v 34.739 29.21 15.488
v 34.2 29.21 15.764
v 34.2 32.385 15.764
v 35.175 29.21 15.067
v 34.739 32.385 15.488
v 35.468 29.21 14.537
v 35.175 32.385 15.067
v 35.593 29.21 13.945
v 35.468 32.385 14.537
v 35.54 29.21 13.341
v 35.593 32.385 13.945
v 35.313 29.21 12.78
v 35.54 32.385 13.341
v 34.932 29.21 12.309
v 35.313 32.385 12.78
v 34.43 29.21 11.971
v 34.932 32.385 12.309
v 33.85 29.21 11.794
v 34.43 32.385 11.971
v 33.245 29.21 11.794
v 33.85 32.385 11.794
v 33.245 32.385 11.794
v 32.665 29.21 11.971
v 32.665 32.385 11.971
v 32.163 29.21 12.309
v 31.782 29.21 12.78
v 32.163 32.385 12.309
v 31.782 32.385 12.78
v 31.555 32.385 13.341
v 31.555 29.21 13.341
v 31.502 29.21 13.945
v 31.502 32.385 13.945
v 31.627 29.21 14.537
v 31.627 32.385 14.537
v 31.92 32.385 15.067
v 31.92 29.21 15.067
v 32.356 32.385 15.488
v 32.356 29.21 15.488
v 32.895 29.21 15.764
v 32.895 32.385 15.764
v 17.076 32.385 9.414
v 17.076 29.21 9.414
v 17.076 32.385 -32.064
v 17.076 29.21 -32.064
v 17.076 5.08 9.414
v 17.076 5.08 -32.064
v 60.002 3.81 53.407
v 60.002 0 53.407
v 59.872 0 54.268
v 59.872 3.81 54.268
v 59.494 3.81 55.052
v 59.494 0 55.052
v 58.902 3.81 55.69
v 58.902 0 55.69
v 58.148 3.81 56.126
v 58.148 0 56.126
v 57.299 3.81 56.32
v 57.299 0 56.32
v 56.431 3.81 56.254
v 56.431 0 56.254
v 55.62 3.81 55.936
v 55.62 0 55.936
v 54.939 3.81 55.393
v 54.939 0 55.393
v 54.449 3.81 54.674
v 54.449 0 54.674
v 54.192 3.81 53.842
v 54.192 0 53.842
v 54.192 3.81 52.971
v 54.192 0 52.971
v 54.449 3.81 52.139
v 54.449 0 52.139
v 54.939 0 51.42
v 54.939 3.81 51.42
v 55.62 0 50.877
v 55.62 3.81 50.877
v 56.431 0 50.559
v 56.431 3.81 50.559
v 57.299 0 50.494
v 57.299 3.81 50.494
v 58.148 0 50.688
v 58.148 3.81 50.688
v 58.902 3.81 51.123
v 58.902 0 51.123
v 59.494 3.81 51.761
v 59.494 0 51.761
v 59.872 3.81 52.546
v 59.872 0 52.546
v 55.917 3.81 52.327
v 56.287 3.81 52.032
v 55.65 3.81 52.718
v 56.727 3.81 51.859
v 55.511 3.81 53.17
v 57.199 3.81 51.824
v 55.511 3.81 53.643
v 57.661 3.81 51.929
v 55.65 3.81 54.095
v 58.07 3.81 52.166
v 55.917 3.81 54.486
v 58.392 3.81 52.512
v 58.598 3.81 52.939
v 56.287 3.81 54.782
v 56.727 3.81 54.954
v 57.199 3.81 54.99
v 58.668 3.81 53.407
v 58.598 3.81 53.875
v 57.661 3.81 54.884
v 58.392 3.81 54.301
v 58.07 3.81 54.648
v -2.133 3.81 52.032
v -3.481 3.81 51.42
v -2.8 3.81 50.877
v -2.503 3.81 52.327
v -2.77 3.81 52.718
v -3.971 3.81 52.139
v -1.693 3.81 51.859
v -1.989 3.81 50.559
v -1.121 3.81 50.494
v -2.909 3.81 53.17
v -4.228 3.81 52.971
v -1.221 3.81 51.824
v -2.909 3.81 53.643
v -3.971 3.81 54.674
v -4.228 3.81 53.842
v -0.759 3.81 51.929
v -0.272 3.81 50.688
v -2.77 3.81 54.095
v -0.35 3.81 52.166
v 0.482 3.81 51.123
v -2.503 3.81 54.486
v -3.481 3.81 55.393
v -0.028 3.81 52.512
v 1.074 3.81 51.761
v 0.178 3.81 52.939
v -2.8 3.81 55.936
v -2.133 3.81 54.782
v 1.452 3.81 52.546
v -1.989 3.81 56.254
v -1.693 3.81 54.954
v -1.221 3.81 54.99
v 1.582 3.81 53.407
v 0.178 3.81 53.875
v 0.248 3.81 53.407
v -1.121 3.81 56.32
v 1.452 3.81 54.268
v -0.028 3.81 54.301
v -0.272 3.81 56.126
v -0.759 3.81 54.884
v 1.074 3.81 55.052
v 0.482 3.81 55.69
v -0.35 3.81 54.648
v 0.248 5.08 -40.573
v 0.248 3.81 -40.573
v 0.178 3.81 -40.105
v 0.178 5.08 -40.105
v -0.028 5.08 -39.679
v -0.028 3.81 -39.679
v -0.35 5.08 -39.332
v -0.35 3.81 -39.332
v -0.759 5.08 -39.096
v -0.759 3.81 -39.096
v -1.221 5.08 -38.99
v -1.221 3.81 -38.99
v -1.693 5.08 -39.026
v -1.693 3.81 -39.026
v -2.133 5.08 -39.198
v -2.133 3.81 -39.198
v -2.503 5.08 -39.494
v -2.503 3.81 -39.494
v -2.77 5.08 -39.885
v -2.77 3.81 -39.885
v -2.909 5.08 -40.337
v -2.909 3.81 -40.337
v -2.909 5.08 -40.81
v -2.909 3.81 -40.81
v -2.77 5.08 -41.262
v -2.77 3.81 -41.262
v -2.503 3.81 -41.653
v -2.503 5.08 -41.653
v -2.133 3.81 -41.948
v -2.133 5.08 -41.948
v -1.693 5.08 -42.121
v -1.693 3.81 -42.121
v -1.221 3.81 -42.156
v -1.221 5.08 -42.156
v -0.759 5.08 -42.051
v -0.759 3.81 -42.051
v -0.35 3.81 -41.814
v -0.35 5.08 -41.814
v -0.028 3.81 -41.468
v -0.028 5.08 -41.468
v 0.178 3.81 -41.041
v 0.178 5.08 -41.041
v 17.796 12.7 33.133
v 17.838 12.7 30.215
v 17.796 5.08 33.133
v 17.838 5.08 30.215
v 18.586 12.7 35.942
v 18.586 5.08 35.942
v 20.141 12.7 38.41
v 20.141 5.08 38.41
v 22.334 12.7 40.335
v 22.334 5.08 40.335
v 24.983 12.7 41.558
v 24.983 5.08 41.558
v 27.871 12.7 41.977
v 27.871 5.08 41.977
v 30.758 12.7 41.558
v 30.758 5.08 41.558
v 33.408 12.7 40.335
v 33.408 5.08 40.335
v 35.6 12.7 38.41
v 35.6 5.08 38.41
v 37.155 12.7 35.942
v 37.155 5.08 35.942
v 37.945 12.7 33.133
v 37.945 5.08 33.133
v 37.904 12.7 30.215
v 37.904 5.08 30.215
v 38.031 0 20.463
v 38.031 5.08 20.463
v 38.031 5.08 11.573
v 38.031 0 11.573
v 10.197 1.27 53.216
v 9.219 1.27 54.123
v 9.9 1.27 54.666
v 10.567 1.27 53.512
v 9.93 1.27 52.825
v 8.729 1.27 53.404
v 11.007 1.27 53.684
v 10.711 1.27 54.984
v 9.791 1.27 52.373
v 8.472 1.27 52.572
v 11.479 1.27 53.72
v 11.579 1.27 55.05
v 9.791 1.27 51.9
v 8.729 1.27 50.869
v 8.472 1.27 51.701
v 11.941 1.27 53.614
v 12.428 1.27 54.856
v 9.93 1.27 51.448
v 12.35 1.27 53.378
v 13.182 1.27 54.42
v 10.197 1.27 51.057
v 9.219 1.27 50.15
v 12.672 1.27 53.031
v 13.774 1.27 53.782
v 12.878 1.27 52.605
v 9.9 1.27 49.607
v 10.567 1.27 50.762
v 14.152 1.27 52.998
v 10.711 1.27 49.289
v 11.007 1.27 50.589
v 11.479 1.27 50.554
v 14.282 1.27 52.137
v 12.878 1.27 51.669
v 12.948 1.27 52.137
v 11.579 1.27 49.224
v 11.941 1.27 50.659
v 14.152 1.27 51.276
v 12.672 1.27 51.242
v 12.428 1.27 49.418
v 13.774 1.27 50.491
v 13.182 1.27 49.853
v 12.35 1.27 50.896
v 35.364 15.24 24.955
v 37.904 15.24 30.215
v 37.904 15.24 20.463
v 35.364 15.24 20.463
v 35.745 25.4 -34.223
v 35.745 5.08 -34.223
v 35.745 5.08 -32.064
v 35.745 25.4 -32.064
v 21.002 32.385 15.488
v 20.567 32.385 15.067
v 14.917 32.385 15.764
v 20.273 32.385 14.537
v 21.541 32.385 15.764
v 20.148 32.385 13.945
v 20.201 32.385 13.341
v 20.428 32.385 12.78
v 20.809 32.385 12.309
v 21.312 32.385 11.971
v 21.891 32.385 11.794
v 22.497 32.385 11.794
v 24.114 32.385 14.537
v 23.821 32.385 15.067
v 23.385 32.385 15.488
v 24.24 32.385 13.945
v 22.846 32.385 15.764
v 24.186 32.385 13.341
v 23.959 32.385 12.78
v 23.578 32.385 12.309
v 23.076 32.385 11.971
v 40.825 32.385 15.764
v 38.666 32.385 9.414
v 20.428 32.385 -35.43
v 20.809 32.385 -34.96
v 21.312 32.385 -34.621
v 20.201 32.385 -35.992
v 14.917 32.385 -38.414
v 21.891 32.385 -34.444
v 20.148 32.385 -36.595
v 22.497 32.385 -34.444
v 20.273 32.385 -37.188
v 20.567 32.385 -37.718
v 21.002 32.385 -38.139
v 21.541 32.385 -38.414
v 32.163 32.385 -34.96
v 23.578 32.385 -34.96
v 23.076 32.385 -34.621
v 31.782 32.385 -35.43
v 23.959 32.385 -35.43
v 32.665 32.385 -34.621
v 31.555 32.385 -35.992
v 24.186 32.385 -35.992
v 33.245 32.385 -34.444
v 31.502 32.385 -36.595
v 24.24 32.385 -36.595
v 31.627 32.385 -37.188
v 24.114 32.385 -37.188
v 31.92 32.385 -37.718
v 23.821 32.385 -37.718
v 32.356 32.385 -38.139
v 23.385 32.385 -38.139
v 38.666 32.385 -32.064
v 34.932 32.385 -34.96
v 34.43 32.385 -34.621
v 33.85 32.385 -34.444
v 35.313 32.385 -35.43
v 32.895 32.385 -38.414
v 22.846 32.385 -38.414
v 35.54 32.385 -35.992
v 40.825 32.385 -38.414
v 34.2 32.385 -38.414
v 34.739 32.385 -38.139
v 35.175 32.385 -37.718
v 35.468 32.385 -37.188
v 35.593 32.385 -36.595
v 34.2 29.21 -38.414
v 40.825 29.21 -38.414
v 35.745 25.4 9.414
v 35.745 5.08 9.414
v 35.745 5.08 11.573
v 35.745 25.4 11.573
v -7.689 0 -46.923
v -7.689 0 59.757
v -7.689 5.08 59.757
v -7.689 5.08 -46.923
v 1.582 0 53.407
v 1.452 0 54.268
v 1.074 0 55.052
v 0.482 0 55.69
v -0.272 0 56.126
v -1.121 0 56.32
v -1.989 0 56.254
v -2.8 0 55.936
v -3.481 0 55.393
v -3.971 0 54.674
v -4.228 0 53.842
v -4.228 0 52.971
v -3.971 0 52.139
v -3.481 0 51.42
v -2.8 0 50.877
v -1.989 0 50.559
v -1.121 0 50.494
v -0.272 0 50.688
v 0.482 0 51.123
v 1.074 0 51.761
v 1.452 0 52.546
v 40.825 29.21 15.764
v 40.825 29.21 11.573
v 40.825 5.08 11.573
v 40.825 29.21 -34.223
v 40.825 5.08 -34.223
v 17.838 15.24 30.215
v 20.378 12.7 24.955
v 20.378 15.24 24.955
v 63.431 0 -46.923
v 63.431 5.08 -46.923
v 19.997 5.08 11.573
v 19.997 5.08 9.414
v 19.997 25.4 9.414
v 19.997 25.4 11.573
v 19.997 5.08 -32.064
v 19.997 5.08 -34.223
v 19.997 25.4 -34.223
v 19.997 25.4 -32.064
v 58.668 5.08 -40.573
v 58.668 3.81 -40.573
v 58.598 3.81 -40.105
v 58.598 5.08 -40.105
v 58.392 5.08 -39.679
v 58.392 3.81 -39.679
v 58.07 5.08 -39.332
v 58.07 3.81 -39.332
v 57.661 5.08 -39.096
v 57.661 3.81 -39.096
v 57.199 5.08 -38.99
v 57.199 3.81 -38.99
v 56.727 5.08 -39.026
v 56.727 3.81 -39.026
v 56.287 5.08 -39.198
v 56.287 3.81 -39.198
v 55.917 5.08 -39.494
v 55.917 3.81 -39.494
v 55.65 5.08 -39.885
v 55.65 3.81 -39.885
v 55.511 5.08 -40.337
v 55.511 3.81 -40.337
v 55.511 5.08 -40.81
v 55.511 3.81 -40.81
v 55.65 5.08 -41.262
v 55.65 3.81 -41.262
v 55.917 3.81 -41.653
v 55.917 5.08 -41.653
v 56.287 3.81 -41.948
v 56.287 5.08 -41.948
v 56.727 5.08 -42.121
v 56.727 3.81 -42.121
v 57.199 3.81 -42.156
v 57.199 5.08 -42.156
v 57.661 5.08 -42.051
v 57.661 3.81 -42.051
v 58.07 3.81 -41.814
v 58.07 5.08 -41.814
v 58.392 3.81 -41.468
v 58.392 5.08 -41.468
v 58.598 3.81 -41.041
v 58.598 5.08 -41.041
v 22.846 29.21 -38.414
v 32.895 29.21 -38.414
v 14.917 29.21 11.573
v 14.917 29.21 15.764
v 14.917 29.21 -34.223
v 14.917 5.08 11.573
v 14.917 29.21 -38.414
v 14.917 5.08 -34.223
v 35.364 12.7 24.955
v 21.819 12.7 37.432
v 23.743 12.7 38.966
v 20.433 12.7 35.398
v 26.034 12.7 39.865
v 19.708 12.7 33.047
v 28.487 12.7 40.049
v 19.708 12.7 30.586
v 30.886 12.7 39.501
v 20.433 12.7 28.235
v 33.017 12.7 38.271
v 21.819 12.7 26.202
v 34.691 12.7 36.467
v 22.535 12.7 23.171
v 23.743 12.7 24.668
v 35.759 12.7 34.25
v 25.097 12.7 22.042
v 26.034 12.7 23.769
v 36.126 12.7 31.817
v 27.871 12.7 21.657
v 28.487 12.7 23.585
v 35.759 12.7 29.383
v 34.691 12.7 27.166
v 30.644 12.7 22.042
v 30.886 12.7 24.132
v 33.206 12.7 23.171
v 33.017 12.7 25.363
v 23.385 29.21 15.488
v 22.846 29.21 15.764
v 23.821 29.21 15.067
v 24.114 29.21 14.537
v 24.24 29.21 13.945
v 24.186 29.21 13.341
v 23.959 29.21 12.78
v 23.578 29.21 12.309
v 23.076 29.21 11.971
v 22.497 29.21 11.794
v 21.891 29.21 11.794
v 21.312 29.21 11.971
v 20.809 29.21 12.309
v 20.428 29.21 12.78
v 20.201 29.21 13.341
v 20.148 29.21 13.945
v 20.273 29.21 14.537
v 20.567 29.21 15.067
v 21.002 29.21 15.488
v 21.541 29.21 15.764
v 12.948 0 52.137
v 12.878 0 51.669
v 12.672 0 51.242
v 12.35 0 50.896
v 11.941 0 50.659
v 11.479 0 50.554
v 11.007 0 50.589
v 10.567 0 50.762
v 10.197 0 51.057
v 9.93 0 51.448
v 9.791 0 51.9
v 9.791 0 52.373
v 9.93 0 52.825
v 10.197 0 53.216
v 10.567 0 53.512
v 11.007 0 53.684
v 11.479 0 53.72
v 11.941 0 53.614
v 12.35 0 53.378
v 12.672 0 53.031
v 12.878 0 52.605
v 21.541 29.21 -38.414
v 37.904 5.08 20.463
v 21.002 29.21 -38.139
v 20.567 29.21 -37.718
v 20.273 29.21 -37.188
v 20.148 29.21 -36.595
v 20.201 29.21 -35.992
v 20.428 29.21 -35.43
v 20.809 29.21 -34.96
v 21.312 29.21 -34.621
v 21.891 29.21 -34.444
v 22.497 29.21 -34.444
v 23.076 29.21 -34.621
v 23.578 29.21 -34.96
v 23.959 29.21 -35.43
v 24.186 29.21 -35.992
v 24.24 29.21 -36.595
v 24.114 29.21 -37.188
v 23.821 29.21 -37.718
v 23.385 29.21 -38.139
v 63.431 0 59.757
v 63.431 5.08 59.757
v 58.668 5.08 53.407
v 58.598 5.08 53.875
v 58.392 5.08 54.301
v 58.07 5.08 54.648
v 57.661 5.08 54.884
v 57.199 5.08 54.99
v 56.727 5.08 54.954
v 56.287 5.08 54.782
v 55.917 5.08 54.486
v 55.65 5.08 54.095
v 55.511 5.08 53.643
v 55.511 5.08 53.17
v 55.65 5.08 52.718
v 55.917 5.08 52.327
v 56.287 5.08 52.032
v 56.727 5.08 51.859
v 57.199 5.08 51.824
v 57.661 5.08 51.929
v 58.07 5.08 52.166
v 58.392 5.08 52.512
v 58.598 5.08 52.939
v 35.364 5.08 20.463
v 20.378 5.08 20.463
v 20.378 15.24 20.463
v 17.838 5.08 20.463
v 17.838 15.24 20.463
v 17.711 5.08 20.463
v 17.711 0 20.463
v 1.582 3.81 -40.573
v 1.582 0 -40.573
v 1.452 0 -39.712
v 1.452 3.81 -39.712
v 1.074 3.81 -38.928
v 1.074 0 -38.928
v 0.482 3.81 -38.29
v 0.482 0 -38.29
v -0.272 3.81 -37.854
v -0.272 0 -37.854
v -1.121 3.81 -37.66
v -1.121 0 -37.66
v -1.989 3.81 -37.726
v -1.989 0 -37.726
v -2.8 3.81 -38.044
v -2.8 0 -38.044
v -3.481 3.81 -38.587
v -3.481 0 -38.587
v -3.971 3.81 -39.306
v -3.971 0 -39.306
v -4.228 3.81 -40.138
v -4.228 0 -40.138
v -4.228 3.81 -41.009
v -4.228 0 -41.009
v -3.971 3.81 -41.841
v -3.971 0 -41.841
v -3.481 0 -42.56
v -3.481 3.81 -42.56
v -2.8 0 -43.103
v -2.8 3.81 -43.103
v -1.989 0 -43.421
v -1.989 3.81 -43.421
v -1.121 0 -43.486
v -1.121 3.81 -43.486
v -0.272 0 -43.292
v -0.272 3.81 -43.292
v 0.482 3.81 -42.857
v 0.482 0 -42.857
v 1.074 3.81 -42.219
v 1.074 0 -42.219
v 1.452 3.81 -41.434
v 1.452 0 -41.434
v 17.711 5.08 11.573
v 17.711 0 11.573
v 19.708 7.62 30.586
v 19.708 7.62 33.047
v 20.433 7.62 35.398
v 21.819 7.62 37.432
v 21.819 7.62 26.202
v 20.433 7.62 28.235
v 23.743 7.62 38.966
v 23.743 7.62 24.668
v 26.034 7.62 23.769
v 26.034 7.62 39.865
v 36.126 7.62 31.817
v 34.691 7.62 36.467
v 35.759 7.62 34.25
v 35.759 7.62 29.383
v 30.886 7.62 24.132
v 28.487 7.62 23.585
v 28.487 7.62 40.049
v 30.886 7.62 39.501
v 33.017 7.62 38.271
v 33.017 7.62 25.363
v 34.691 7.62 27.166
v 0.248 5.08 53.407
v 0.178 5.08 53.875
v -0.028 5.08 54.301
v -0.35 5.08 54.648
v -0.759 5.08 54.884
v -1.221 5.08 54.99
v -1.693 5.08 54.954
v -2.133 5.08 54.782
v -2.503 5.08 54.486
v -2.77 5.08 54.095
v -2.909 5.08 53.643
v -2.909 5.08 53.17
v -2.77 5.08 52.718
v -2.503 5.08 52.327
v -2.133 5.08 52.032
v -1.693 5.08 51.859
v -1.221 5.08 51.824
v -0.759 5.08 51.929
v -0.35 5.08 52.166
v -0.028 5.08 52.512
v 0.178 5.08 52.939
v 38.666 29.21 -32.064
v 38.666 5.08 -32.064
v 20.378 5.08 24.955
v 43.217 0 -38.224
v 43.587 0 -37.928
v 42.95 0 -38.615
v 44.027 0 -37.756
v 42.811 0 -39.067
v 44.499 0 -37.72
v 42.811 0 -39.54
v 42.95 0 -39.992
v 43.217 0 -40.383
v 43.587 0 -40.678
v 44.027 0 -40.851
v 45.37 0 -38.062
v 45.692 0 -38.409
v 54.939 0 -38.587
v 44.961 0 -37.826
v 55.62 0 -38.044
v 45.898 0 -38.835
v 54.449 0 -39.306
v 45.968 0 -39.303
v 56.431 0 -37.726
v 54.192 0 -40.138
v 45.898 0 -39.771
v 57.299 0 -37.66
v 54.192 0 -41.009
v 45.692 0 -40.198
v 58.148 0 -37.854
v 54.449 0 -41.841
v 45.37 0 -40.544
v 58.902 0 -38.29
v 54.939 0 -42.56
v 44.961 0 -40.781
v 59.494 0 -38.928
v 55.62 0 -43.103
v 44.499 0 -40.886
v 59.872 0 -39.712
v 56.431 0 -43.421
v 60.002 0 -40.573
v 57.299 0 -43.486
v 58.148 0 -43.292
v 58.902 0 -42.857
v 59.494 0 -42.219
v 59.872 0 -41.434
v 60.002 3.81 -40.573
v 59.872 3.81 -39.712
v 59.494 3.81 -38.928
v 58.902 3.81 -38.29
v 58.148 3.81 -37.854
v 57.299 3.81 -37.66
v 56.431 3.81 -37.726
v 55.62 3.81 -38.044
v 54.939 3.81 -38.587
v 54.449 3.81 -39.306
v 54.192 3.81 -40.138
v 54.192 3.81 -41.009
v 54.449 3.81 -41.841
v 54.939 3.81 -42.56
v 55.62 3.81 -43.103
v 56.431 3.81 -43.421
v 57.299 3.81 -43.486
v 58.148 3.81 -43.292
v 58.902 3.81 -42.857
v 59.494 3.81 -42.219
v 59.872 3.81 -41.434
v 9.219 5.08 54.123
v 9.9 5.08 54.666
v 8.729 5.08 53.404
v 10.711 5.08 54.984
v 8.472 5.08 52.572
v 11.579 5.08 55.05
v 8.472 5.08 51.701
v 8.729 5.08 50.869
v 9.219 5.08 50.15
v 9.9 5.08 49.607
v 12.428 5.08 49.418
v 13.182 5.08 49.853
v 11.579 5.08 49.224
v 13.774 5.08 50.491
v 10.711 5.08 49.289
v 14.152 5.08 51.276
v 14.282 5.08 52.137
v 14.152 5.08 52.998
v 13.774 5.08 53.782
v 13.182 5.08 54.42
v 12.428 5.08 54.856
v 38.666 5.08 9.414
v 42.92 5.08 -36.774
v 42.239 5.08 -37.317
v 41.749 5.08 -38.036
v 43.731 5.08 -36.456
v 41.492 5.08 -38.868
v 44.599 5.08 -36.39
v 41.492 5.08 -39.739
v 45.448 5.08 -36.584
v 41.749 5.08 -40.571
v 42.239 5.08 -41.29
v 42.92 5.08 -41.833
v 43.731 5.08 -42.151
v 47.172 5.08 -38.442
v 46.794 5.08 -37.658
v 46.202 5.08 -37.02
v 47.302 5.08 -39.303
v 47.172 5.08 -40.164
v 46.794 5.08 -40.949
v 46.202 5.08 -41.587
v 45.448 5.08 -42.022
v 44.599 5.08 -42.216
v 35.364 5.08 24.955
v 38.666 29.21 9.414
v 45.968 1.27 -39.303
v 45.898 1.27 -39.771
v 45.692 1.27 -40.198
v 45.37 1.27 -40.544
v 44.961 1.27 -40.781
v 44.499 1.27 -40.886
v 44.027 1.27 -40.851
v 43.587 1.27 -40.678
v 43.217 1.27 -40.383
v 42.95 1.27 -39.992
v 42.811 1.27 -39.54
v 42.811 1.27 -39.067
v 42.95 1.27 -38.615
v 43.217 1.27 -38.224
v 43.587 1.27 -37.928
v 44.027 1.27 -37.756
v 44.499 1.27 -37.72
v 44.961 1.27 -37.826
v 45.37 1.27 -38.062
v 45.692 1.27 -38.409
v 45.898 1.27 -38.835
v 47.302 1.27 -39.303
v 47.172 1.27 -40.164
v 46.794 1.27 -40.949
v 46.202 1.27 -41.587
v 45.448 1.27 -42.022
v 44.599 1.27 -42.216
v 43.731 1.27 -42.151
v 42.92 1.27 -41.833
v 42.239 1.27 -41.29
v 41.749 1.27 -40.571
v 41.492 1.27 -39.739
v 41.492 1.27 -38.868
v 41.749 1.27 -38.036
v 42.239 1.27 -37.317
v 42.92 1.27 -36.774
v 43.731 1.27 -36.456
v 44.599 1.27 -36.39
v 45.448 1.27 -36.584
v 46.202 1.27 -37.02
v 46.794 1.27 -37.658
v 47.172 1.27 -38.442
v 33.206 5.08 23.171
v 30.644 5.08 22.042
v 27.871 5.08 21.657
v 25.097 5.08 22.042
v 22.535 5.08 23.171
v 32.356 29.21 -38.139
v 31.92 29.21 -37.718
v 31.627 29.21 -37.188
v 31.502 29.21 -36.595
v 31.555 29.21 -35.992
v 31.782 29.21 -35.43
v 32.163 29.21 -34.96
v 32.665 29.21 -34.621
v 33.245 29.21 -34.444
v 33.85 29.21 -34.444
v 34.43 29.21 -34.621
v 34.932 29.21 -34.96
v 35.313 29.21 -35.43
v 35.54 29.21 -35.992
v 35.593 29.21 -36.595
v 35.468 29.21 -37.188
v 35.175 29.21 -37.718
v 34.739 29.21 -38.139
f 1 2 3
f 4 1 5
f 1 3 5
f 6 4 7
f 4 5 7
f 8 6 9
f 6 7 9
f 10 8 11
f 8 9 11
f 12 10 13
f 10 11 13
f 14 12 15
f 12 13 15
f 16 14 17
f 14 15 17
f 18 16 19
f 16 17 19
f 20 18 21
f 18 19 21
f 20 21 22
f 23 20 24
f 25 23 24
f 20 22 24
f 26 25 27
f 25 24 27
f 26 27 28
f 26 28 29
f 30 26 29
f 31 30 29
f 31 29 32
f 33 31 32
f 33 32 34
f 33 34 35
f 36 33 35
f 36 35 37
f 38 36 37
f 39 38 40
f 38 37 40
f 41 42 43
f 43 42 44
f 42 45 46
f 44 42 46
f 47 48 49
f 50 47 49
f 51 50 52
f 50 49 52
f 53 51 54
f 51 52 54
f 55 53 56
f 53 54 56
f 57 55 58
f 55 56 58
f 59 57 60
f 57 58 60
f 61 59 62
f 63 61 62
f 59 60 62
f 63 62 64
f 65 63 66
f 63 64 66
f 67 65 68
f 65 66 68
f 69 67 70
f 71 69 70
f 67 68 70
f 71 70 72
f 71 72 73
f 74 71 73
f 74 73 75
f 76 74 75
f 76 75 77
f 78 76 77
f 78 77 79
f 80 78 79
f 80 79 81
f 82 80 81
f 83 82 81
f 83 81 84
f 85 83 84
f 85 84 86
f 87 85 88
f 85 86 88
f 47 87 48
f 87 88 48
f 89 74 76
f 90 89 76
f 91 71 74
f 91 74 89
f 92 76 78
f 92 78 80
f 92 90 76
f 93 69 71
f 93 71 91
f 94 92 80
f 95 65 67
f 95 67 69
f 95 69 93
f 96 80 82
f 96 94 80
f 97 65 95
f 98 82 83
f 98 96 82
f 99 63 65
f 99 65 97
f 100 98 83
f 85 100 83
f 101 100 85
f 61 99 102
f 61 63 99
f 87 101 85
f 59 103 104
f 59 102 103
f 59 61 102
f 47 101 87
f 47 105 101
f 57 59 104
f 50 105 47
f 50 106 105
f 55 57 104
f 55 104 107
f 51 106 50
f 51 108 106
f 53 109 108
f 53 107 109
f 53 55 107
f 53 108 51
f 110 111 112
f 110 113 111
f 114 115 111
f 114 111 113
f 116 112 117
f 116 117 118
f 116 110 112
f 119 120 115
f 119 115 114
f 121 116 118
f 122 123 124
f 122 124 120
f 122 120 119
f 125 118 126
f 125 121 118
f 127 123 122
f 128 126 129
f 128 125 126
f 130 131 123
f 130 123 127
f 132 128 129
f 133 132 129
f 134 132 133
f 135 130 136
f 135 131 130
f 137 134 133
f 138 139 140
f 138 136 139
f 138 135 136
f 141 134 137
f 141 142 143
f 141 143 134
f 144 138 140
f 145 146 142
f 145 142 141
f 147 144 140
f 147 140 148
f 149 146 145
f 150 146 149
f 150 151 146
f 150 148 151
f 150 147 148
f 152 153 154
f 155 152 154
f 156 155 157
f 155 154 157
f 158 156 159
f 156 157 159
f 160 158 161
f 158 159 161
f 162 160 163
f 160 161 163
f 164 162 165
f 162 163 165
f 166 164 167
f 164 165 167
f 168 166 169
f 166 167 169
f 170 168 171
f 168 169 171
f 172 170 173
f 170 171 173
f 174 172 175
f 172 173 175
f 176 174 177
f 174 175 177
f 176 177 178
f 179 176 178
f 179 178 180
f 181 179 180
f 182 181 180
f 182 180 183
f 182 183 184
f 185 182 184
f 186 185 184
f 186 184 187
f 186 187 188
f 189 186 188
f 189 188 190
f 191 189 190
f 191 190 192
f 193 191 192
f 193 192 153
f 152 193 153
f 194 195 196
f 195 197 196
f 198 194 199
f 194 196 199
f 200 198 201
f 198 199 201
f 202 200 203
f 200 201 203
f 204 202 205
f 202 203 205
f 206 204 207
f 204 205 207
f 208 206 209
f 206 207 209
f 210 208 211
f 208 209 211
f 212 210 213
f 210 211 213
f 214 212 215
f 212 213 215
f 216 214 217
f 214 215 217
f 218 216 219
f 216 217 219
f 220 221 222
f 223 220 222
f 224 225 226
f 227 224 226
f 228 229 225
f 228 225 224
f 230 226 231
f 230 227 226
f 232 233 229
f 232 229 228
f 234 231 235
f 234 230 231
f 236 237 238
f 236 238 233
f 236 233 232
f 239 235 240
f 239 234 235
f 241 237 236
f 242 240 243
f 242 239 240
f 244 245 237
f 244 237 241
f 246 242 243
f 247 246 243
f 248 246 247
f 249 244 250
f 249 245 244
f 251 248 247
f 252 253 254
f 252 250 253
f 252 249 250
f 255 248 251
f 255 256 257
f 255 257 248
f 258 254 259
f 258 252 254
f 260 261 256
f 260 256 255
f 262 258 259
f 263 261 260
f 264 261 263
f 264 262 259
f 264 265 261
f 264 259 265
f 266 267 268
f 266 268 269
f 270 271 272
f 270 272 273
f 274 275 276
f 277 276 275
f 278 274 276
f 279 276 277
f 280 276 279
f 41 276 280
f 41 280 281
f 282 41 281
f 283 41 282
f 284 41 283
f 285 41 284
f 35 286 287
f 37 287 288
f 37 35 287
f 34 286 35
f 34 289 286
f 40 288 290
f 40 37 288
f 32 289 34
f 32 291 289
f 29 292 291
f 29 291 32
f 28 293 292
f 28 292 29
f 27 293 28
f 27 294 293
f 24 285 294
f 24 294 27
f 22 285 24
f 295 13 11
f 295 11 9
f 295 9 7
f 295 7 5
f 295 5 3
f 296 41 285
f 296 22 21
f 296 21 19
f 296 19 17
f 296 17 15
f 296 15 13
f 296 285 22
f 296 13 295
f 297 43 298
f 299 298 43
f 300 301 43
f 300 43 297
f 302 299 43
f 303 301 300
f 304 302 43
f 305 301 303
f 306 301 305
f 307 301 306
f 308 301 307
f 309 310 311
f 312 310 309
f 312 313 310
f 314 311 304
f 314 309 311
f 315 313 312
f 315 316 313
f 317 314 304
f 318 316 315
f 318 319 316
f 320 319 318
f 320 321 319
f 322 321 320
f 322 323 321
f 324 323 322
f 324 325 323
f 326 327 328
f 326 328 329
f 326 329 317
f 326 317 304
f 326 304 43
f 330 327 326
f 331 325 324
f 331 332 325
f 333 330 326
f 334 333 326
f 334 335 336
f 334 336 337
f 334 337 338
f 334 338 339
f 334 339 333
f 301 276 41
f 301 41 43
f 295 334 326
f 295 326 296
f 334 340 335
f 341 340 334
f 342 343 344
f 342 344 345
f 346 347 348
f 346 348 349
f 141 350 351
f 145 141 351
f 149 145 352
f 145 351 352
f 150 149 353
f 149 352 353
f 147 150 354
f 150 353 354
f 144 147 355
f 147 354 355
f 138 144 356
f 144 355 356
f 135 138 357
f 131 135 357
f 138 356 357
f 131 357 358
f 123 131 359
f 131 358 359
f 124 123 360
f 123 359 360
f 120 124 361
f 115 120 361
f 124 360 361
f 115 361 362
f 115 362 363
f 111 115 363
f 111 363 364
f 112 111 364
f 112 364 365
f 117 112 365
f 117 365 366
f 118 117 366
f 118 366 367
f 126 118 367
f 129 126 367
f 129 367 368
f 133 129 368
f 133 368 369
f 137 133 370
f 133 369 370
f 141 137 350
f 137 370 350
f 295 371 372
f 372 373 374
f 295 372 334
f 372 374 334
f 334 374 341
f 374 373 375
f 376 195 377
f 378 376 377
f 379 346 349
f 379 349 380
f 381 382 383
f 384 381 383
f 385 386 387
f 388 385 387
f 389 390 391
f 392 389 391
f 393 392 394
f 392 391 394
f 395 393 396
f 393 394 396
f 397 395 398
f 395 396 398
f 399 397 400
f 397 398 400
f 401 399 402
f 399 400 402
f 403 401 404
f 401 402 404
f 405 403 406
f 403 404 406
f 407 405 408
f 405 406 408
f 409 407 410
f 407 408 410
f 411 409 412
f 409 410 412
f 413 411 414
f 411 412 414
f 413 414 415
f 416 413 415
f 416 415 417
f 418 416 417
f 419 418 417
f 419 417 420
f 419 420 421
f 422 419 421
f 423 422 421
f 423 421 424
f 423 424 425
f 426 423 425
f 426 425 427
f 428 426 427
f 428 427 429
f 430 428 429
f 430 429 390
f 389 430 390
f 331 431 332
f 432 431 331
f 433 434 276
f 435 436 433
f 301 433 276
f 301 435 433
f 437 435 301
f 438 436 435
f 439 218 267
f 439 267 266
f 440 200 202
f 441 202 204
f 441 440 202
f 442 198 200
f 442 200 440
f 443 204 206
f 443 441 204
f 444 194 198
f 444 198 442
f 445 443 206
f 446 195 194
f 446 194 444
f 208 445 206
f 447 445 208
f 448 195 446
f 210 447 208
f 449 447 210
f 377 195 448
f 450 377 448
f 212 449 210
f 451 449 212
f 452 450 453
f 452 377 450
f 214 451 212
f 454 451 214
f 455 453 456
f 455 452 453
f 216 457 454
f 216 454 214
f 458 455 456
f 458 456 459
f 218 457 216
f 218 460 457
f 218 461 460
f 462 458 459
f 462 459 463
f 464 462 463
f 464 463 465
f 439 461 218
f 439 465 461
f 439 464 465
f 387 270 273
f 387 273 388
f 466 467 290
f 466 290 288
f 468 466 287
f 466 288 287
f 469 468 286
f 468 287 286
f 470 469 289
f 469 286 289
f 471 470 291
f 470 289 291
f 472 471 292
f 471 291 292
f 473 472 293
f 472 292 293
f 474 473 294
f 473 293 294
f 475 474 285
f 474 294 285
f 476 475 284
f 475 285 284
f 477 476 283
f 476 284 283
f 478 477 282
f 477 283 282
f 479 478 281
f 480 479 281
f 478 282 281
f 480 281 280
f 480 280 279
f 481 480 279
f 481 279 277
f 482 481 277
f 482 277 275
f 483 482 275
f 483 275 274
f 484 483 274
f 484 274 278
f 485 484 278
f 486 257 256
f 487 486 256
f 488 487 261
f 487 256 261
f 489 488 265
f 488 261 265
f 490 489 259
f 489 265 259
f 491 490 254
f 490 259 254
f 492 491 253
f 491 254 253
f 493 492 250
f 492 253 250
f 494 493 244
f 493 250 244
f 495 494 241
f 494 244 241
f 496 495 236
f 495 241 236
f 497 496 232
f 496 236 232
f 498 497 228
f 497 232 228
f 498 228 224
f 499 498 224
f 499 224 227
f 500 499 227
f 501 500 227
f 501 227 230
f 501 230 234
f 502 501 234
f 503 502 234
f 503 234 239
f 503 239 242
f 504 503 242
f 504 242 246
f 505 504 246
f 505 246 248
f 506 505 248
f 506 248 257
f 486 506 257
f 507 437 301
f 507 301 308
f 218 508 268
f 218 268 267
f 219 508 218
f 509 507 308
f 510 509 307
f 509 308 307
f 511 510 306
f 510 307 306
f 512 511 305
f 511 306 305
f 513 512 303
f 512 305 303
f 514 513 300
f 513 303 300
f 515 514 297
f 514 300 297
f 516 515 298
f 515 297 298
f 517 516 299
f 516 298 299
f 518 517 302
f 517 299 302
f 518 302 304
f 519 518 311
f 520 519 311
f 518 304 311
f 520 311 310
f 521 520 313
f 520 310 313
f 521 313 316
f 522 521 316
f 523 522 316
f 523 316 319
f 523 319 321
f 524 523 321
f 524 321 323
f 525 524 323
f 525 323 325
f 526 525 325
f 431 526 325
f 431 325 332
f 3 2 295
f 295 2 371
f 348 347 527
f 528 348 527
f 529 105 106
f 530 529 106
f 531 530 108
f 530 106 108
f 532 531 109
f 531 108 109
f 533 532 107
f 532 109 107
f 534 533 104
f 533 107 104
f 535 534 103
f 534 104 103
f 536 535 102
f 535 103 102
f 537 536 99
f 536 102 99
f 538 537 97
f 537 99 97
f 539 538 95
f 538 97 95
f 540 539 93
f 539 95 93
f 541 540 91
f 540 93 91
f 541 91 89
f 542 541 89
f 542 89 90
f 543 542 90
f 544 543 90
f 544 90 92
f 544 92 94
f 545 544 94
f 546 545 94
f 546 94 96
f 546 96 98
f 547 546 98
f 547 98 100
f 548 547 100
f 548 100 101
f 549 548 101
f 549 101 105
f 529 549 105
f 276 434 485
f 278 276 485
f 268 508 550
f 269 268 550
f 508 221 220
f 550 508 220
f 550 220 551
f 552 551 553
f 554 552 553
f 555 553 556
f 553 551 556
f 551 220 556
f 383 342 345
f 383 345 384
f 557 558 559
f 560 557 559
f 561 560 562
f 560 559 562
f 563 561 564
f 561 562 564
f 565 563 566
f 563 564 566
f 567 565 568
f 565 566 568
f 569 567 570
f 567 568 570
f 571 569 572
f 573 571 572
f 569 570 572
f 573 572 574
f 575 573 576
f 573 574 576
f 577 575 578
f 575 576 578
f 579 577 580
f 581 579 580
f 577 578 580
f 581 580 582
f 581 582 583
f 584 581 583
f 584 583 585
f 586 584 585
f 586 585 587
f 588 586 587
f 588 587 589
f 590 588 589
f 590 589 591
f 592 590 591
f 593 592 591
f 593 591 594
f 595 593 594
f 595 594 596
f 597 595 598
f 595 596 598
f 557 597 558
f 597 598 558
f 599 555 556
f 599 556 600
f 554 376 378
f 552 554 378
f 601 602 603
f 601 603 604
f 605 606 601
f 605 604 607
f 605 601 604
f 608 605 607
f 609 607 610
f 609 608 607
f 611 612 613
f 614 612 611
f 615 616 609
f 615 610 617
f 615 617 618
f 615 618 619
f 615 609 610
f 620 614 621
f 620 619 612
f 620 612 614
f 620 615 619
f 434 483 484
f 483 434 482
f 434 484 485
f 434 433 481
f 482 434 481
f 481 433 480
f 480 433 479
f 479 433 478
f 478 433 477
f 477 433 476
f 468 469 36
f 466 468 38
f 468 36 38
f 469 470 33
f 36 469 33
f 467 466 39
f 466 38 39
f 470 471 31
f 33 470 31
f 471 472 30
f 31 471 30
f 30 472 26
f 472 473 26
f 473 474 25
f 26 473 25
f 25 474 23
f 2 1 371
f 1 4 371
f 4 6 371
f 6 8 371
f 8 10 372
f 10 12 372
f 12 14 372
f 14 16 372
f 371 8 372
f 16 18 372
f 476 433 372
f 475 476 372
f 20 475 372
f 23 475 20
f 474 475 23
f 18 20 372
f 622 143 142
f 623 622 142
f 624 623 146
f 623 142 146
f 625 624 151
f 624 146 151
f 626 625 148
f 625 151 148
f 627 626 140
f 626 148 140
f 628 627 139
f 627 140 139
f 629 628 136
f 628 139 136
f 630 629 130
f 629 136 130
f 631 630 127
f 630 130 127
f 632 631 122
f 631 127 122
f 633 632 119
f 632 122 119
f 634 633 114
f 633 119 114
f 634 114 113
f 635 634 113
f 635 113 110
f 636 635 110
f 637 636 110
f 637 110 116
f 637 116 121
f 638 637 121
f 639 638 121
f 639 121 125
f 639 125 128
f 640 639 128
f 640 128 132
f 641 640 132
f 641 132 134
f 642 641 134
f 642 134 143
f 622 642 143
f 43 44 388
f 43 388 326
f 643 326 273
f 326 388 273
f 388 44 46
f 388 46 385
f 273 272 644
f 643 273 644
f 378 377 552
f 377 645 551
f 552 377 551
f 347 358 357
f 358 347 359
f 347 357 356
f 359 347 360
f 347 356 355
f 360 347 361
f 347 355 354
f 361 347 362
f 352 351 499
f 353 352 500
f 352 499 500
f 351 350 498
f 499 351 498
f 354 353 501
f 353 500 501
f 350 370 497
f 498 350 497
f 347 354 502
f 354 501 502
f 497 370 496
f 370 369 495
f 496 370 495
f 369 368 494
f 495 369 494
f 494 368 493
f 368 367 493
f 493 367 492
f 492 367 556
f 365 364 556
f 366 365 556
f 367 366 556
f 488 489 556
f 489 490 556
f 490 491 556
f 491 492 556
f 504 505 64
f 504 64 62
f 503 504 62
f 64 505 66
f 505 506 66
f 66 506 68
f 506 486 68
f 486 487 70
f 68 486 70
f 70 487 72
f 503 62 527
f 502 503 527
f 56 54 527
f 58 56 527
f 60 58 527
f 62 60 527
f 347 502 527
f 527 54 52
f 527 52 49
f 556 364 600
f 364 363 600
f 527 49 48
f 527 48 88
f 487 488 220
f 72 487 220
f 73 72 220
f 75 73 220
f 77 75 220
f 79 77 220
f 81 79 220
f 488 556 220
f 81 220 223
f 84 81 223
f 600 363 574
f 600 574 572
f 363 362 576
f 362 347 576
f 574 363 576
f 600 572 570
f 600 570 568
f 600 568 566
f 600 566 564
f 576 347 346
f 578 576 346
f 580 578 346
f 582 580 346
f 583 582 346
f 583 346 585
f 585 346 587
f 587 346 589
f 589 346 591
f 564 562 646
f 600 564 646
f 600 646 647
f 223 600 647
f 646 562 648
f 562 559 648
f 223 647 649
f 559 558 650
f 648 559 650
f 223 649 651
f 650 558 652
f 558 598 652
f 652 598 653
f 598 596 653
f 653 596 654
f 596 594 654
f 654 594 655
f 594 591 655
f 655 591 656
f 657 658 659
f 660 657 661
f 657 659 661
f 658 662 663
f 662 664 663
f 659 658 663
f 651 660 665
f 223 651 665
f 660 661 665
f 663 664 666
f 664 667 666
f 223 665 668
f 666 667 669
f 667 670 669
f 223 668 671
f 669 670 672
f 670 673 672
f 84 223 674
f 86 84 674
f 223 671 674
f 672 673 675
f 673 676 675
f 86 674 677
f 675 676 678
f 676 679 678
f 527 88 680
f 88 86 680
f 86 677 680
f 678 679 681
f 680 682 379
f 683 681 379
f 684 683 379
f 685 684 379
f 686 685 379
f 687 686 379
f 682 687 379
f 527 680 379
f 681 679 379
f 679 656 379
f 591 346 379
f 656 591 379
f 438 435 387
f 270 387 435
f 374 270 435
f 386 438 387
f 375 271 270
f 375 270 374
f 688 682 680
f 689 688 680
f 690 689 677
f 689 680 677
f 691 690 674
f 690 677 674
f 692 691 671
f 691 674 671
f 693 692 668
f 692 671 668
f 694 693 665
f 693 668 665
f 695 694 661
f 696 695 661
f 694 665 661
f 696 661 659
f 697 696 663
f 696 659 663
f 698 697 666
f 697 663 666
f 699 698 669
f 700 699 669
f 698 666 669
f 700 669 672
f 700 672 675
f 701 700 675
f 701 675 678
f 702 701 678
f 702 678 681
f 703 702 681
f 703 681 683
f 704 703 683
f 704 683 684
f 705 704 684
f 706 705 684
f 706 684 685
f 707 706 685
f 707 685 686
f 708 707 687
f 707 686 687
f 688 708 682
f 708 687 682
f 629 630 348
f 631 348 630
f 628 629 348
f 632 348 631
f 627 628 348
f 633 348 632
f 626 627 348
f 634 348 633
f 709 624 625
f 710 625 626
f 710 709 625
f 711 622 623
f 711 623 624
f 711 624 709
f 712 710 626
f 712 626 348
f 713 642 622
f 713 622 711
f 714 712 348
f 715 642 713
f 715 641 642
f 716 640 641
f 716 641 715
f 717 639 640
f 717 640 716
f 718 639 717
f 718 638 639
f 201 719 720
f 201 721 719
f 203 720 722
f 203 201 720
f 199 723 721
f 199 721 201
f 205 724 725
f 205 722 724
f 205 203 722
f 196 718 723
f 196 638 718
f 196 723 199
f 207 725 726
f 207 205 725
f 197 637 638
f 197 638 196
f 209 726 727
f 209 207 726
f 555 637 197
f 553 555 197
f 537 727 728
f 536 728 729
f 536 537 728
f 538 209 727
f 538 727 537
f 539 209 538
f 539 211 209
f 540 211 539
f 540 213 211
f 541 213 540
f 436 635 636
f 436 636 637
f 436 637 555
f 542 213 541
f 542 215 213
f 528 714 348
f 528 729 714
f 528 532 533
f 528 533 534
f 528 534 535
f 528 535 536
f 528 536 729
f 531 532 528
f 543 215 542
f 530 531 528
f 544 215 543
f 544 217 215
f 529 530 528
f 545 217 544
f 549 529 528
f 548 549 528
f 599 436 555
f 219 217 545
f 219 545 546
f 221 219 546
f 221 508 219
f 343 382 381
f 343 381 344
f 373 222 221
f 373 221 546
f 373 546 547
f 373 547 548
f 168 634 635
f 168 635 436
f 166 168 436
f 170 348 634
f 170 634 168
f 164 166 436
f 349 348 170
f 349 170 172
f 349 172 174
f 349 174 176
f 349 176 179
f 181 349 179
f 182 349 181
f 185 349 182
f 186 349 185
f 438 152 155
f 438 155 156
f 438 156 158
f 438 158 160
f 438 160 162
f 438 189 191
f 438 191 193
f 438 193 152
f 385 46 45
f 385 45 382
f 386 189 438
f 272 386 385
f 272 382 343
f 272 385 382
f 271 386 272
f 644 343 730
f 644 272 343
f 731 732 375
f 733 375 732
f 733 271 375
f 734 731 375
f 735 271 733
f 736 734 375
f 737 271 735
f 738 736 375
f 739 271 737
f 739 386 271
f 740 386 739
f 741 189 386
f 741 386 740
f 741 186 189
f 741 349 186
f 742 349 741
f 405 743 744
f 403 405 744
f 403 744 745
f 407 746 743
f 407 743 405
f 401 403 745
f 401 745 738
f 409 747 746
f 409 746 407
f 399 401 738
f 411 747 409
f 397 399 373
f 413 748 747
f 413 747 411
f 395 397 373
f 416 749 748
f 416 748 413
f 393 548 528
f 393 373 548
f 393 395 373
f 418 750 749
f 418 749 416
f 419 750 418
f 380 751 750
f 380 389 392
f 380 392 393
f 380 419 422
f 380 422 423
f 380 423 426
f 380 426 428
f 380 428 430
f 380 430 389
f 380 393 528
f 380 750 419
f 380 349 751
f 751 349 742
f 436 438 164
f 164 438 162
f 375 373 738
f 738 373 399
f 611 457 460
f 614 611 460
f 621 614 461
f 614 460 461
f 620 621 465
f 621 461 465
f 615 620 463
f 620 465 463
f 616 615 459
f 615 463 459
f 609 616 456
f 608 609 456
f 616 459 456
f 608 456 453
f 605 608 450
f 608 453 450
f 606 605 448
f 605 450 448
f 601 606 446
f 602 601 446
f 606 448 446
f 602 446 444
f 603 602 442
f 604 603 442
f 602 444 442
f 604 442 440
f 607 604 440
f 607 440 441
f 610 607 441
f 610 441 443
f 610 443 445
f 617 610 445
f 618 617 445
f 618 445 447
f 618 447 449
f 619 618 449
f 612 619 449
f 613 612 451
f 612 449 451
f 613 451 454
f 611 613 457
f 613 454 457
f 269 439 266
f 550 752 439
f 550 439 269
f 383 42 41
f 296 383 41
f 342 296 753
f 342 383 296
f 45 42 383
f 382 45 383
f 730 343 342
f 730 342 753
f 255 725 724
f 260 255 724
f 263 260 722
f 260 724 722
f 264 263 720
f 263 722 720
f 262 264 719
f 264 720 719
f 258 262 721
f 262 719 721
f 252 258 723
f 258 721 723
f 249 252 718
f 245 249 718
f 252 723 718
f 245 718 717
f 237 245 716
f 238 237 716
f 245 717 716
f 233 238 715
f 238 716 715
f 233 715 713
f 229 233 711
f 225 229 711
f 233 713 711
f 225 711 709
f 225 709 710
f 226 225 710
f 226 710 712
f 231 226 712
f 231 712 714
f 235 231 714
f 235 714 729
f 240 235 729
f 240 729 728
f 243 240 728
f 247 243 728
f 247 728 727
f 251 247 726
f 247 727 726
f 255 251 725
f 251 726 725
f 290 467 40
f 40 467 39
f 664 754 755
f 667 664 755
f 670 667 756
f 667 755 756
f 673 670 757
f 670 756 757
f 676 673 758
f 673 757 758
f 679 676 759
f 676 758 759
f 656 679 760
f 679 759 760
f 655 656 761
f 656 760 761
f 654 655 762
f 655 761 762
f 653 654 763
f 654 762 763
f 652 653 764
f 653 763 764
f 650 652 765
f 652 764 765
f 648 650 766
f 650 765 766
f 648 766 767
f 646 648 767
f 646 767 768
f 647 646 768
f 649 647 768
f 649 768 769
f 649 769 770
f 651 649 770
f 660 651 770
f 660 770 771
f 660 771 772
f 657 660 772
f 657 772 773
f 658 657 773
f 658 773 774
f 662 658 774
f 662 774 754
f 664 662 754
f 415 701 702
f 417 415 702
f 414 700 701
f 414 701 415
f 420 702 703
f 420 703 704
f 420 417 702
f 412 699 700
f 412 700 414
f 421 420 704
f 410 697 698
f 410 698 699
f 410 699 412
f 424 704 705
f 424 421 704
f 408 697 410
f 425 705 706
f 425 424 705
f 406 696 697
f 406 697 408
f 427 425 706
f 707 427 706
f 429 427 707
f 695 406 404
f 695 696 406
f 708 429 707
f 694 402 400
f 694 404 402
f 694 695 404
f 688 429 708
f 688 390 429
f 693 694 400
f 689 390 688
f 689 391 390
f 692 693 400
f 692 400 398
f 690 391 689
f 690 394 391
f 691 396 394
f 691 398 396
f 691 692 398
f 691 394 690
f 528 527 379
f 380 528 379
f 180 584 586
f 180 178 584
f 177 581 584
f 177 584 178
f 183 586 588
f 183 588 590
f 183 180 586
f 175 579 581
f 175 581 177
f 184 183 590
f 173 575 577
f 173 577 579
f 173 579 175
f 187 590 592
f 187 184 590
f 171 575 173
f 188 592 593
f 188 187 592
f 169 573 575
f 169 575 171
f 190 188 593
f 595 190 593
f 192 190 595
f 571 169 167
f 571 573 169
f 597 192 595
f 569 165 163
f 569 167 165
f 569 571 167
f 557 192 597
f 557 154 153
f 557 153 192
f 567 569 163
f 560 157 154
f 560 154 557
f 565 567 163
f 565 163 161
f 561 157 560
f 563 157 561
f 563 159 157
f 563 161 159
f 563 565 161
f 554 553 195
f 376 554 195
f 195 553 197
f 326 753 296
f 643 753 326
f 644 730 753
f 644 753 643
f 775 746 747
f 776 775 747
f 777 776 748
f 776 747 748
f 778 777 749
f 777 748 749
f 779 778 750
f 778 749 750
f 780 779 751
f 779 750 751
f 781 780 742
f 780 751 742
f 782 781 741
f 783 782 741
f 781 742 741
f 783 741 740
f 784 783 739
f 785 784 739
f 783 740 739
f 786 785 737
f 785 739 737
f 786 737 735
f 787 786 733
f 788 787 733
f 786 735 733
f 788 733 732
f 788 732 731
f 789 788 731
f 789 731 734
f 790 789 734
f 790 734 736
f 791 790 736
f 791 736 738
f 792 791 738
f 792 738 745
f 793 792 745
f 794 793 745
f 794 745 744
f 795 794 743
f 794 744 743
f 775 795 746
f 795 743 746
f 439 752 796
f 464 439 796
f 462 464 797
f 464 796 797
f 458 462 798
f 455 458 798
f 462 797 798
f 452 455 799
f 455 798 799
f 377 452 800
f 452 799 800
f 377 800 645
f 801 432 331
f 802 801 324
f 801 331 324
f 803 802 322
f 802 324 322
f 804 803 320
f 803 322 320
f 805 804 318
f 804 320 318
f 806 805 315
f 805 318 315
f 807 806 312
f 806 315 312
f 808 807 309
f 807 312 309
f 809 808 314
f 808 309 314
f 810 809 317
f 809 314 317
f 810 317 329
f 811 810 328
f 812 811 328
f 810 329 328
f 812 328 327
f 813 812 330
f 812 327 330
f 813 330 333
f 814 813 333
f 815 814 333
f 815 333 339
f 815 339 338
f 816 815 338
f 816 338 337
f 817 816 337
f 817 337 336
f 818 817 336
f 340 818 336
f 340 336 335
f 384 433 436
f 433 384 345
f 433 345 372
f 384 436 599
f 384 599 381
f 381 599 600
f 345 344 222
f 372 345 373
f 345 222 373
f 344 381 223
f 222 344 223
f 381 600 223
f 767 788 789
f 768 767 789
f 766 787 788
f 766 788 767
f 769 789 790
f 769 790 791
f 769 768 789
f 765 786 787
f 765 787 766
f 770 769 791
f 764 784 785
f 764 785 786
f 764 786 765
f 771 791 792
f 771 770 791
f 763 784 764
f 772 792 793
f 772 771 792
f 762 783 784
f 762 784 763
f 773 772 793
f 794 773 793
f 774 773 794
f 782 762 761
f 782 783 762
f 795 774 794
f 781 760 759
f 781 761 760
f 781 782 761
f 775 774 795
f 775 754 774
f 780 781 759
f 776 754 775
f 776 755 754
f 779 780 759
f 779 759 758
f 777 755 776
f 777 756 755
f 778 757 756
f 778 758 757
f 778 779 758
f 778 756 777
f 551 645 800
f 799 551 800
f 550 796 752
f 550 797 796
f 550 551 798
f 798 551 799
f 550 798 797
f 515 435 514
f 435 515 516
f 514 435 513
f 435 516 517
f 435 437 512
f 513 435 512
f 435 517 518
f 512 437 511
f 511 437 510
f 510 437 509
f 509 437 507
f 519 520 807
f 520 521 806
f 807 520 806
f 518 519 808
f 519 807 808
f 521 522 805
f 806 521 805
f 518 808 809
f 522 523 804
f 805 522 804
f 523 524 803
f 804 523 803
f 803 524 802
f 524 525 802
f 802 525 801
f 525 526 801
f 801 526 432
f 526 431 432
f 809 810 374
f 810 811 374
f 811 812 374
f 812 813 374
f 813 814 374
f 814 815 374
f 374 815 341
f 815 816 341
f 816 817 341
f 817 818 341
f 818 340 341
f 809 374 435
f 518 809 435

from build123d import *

# Parameters (mm, degrees)
SKETCH1_W           = 71.12
SKETCH1_H           = 106.68
BOSS_EXTRUDE1_DEPTH = 5.08
SKETCH3_W           = 25.908
SKETCH3_H           = 45.7962
SKETCH3_W_2         = 21.59
SKETCH3_H_2         = 41.4782
BOSS_EXTRUDE2_DEPTH = 24.13
SKETCH4_W           = 25.908
SKETCH4_H           = 54.1782
SKETCH4_W_2         = 21.59
SKETCH4_H_2         = 41.4782
BOSS_EXTRUDE3_DEPTH = 3.175
SKETCH5_R           = 2.04968221
CUT_EXTRUDE1_DEPTH  = 3.175
SKETCH7_W           = 15.748
SKETCH7_H           = 20.32
CUT_EXTRUDE3_DEPTH  = 45.7962
SKETCH8_R           = 10.16
BOSS_EXTRUDE4_DEPTH = 7.62
SKETCH9_R           = 8.255
CUT_EXTRUDE4_DEPTH  = 5.08
SKETCH10_W          = 20.32
SKETCH10_H          = 8.89
CUT_EXTRUDE5_DEPTH  = 6.08
SKETCH11_R          = 1.5875
CUT_EXTRUDE6_DEPTH  = 6.08
SKETCH15_R          = 2.921
CUT_EXTRUDE7_DEPTH  = 3.81
SKETCH16_R          = 2.921
CUT_EXTRUDE8_DEPTH  = 3.81
SKETCH17_R          = 1.5875
CUT_EXTRUDE9_DEPTH  = 33.385
BOSS_EXTRUDE5_DEPTH = 10.16


with BuildPart() as part:
    # Sketch1 → Boss-Extrude1 (new body)
    with BuildSketch(Plane(origin=(56.401870569, 0, 2.613156724), x_dir=(1, 0, 0), z_dir=(0, 1, 0))):
        with Locations((-28.531301018, -3.803535099)):
            Rectangle(SKETCH1_W, SKETCH1_H)
    extrude(amount=BOSS_EXTRUDE1_DEPTH)

    # Sketch3 → Boss-Extrude2 (add)
    with BuildSketch(Plane(origin=(56.401870569, 5.08, 2.613156724), x_dir=(1, 0, 0), z_dir=(0, 1, 0))):
        with Locations((-28.531301018, 13.938364901)):
            Rectangle(SKETCH3_W, SKETCH3_H)
        with Locations((-28.531301018, 13.938364901)):
            Rectangle(SKETCH3_W_2, SKETCH3_H_2, mode=Mode.SUBTRACT)
    extrude(amount=BOSS_EXTRUDE2_DEPTH)

    # Sketch4 → Boss-Extrude3 (add)
    with BuildSketch(Plane(origin=(0, 29.21, 0), x_dir=(1, 0, 0), z_dir=(0, 1, 0))):
        with Locations((27.87056955, 11.325208176)):
            Rectangle(SKETCH4_W, SKETCH4_H)
        with Locations((27.87056955, 11.325208176)):
            Rectangle(SKETCH4_W_2, SKETCH4_H_2, mode=Mode.SUBTRACT)
    extrude(amount=BOSS_EXTRUDE3_DEPTH)

    # Sketch5 → Cut-Extrude1 (cut)
    with BuildSketch(Plane(origin=(0, 32.385, 0), x_dir=(1, 0, 0), z_dir=(0, 1, 0))):
        with Locations((22.19366955, 36.471208176)):
            Circle(SKETCH5_R)
        with Locations((33.54746955, 36.471208176)):
            Circle(SKETCH5_R)
        with Locations((22.19366955, -13.820791824)):
            Circle(SKETCH5_R)
        with Locations((33.54746955, -13.820791824)):
            Circle(SKETCH5_R)
    extrude(amount=-CUT_EXTRUDE1_DEPTH, mode=Mode.SUBTRACT)

    # Sketch7 → Cut-Extrude3 (cut)
    with BuildSketch(Plane(origin=(0, 0, -34.223308176), x_dir=(-1, 0, 0), z_dir=(0, 0, -1))):
        with Locations((-27.87056955, 15.24)):
            Rectangle(SKETCH7_W, SKETCH7_H)
    extrude(amount=-CUT_EXTRUDE3_DEPTH, mode=Mode.SUBTRACT)

    # Sketch8 → Boss-Extrude4 (add)
    with BuildSketch(Plane(origin=(0, 5.08, 0), x_dir=(1, 0, 0), z_dir=(0, 1, 0))):
        with Locations((27.87056955, -31.816691824)):
            Circle(SKETCH8_R)
    extrude(amount=BOSS_EXTRUDE4_DEPTH)

    # Sketch9 → Cut-Extrude4 (cut)
    with BuildSketch(Plane(origin=(0, 12.7, 0), x_dir=(1, 0, 0), z_dir=(0, 1, 0))):
        with Locations((27.87056955, -31.816691824)):
            Circle(SKETCH9_R)
    extrude(amount=-CUT_EXTRUDE4_DEPTH, mode=Mode.SUBTRACT)

    # Sketch10 → Cut-Extrude5 (cut, through all)
    with BuildSketch(Plane(origin=(0, 5.08, 0), x_dir=(1, 0, 0), z_dir=(0, 1, 0))):
        with Locations((27.87056955, -16.017891824)):
            Rectangle(SKETCH10_W, SKETCH10_H)
    extrude(amount=-CUT_EXTRUDE5_DEPTH, mode=Mode.SUBTRACT)

    # Sketch11 → Cut-Extrude6 (cut, through all)
    with BuildSketch(Plane(origin=(0, 5.08, 0), x_dir=(1, 0, 0), z_dir=(0, 1, 0))):
        with Locations((44.38056955, 39.303308176)):
            Circle(SKETCH11_R)
        with Locations((11.36056955, -52.136691824)):
            Circle(SKETCH11_R)
    extrude(amount=-CUT_EXTRUDE6_DEPTH, mode=Mode.SUBTRACT)

    # Sketch15 → Cut-Extrude7 (cut)
    with BuildSketch(Plane(origin=(0, 5.08, 0), x_dir=(1, 0, 0), z_dir=(0, 1, 0))):
        with Locations((11.36056955, -52.136691824)):
            Circle(SKETCH15_R)
        with Locations((44.38056955, 39.303308176)):
            Circle(SKETCH15_R)
    extrude(amount=-CUT_EXTRUDE7_DEPTH, mode=Mode.SUBTRACT)

    # Sketch16 → Cut-Extrude8 (cut)
    with BuildSketch(Plane.XZ):
        with Locations((-1.33943045, 53.406691824)):
            Circle(SKETCH16_R)
        with Locations((57.08056955, 53.406691824)):
            Circle(SKETCH16_R)
        with Locations((57.08056955, -40.573308176)):
            Circle(SKETCH16_R)
        with Locations((-1.33943045, -40.573308176)):
            Circle(SKETCH16_R)
    extrude(amount=-CUT_EXTRUDE8_DEPTH, mode=Mode.SUBTRACT)

    # Sketch17 → Cut-Extrude9 (cut, through all)
    with BuildSketch(Plane.XZ):
        with Locations((-1.33943045, 53.406691824)):
            Circle(SKETCH17_R)
        with Locations((57.08056955, 53.406691824)):
            Circle(SKETCH17_R)
        with Locations((57.08056955, -40.573308176)):
            Circle(SKETCH17_R)
        with Locations((-1.33943045, -40.573308176)):
            Circle(SKETCH17_R)
    extrude(amount=-CUT_EXTRUDE9_DEPTH, mode=Mode.SUBTRACT)

    # Sketch23 → Boss-Extrude5 (add)
    with BuildSketch(Plane(origin=(0, 5.08, 0), x_dir=(1, 0, 0), z_dir=(0, 1, 0))):
        Polygon((20.37756955, -20.462891824), (17.83756955, -20.462891824), (17.83756955, -30.215282757), (20.37756955, -24.955164953), align=None)
        Polygon((35.36356955, -20.462891824), (37.90356955, -20.462891824), (37.90356955, -30.215282757), (35.36356955, -24.955164953), align=None)
    extrude(amount=BOSS_EXTRUDE5_DEPTH)


solid = part.part
